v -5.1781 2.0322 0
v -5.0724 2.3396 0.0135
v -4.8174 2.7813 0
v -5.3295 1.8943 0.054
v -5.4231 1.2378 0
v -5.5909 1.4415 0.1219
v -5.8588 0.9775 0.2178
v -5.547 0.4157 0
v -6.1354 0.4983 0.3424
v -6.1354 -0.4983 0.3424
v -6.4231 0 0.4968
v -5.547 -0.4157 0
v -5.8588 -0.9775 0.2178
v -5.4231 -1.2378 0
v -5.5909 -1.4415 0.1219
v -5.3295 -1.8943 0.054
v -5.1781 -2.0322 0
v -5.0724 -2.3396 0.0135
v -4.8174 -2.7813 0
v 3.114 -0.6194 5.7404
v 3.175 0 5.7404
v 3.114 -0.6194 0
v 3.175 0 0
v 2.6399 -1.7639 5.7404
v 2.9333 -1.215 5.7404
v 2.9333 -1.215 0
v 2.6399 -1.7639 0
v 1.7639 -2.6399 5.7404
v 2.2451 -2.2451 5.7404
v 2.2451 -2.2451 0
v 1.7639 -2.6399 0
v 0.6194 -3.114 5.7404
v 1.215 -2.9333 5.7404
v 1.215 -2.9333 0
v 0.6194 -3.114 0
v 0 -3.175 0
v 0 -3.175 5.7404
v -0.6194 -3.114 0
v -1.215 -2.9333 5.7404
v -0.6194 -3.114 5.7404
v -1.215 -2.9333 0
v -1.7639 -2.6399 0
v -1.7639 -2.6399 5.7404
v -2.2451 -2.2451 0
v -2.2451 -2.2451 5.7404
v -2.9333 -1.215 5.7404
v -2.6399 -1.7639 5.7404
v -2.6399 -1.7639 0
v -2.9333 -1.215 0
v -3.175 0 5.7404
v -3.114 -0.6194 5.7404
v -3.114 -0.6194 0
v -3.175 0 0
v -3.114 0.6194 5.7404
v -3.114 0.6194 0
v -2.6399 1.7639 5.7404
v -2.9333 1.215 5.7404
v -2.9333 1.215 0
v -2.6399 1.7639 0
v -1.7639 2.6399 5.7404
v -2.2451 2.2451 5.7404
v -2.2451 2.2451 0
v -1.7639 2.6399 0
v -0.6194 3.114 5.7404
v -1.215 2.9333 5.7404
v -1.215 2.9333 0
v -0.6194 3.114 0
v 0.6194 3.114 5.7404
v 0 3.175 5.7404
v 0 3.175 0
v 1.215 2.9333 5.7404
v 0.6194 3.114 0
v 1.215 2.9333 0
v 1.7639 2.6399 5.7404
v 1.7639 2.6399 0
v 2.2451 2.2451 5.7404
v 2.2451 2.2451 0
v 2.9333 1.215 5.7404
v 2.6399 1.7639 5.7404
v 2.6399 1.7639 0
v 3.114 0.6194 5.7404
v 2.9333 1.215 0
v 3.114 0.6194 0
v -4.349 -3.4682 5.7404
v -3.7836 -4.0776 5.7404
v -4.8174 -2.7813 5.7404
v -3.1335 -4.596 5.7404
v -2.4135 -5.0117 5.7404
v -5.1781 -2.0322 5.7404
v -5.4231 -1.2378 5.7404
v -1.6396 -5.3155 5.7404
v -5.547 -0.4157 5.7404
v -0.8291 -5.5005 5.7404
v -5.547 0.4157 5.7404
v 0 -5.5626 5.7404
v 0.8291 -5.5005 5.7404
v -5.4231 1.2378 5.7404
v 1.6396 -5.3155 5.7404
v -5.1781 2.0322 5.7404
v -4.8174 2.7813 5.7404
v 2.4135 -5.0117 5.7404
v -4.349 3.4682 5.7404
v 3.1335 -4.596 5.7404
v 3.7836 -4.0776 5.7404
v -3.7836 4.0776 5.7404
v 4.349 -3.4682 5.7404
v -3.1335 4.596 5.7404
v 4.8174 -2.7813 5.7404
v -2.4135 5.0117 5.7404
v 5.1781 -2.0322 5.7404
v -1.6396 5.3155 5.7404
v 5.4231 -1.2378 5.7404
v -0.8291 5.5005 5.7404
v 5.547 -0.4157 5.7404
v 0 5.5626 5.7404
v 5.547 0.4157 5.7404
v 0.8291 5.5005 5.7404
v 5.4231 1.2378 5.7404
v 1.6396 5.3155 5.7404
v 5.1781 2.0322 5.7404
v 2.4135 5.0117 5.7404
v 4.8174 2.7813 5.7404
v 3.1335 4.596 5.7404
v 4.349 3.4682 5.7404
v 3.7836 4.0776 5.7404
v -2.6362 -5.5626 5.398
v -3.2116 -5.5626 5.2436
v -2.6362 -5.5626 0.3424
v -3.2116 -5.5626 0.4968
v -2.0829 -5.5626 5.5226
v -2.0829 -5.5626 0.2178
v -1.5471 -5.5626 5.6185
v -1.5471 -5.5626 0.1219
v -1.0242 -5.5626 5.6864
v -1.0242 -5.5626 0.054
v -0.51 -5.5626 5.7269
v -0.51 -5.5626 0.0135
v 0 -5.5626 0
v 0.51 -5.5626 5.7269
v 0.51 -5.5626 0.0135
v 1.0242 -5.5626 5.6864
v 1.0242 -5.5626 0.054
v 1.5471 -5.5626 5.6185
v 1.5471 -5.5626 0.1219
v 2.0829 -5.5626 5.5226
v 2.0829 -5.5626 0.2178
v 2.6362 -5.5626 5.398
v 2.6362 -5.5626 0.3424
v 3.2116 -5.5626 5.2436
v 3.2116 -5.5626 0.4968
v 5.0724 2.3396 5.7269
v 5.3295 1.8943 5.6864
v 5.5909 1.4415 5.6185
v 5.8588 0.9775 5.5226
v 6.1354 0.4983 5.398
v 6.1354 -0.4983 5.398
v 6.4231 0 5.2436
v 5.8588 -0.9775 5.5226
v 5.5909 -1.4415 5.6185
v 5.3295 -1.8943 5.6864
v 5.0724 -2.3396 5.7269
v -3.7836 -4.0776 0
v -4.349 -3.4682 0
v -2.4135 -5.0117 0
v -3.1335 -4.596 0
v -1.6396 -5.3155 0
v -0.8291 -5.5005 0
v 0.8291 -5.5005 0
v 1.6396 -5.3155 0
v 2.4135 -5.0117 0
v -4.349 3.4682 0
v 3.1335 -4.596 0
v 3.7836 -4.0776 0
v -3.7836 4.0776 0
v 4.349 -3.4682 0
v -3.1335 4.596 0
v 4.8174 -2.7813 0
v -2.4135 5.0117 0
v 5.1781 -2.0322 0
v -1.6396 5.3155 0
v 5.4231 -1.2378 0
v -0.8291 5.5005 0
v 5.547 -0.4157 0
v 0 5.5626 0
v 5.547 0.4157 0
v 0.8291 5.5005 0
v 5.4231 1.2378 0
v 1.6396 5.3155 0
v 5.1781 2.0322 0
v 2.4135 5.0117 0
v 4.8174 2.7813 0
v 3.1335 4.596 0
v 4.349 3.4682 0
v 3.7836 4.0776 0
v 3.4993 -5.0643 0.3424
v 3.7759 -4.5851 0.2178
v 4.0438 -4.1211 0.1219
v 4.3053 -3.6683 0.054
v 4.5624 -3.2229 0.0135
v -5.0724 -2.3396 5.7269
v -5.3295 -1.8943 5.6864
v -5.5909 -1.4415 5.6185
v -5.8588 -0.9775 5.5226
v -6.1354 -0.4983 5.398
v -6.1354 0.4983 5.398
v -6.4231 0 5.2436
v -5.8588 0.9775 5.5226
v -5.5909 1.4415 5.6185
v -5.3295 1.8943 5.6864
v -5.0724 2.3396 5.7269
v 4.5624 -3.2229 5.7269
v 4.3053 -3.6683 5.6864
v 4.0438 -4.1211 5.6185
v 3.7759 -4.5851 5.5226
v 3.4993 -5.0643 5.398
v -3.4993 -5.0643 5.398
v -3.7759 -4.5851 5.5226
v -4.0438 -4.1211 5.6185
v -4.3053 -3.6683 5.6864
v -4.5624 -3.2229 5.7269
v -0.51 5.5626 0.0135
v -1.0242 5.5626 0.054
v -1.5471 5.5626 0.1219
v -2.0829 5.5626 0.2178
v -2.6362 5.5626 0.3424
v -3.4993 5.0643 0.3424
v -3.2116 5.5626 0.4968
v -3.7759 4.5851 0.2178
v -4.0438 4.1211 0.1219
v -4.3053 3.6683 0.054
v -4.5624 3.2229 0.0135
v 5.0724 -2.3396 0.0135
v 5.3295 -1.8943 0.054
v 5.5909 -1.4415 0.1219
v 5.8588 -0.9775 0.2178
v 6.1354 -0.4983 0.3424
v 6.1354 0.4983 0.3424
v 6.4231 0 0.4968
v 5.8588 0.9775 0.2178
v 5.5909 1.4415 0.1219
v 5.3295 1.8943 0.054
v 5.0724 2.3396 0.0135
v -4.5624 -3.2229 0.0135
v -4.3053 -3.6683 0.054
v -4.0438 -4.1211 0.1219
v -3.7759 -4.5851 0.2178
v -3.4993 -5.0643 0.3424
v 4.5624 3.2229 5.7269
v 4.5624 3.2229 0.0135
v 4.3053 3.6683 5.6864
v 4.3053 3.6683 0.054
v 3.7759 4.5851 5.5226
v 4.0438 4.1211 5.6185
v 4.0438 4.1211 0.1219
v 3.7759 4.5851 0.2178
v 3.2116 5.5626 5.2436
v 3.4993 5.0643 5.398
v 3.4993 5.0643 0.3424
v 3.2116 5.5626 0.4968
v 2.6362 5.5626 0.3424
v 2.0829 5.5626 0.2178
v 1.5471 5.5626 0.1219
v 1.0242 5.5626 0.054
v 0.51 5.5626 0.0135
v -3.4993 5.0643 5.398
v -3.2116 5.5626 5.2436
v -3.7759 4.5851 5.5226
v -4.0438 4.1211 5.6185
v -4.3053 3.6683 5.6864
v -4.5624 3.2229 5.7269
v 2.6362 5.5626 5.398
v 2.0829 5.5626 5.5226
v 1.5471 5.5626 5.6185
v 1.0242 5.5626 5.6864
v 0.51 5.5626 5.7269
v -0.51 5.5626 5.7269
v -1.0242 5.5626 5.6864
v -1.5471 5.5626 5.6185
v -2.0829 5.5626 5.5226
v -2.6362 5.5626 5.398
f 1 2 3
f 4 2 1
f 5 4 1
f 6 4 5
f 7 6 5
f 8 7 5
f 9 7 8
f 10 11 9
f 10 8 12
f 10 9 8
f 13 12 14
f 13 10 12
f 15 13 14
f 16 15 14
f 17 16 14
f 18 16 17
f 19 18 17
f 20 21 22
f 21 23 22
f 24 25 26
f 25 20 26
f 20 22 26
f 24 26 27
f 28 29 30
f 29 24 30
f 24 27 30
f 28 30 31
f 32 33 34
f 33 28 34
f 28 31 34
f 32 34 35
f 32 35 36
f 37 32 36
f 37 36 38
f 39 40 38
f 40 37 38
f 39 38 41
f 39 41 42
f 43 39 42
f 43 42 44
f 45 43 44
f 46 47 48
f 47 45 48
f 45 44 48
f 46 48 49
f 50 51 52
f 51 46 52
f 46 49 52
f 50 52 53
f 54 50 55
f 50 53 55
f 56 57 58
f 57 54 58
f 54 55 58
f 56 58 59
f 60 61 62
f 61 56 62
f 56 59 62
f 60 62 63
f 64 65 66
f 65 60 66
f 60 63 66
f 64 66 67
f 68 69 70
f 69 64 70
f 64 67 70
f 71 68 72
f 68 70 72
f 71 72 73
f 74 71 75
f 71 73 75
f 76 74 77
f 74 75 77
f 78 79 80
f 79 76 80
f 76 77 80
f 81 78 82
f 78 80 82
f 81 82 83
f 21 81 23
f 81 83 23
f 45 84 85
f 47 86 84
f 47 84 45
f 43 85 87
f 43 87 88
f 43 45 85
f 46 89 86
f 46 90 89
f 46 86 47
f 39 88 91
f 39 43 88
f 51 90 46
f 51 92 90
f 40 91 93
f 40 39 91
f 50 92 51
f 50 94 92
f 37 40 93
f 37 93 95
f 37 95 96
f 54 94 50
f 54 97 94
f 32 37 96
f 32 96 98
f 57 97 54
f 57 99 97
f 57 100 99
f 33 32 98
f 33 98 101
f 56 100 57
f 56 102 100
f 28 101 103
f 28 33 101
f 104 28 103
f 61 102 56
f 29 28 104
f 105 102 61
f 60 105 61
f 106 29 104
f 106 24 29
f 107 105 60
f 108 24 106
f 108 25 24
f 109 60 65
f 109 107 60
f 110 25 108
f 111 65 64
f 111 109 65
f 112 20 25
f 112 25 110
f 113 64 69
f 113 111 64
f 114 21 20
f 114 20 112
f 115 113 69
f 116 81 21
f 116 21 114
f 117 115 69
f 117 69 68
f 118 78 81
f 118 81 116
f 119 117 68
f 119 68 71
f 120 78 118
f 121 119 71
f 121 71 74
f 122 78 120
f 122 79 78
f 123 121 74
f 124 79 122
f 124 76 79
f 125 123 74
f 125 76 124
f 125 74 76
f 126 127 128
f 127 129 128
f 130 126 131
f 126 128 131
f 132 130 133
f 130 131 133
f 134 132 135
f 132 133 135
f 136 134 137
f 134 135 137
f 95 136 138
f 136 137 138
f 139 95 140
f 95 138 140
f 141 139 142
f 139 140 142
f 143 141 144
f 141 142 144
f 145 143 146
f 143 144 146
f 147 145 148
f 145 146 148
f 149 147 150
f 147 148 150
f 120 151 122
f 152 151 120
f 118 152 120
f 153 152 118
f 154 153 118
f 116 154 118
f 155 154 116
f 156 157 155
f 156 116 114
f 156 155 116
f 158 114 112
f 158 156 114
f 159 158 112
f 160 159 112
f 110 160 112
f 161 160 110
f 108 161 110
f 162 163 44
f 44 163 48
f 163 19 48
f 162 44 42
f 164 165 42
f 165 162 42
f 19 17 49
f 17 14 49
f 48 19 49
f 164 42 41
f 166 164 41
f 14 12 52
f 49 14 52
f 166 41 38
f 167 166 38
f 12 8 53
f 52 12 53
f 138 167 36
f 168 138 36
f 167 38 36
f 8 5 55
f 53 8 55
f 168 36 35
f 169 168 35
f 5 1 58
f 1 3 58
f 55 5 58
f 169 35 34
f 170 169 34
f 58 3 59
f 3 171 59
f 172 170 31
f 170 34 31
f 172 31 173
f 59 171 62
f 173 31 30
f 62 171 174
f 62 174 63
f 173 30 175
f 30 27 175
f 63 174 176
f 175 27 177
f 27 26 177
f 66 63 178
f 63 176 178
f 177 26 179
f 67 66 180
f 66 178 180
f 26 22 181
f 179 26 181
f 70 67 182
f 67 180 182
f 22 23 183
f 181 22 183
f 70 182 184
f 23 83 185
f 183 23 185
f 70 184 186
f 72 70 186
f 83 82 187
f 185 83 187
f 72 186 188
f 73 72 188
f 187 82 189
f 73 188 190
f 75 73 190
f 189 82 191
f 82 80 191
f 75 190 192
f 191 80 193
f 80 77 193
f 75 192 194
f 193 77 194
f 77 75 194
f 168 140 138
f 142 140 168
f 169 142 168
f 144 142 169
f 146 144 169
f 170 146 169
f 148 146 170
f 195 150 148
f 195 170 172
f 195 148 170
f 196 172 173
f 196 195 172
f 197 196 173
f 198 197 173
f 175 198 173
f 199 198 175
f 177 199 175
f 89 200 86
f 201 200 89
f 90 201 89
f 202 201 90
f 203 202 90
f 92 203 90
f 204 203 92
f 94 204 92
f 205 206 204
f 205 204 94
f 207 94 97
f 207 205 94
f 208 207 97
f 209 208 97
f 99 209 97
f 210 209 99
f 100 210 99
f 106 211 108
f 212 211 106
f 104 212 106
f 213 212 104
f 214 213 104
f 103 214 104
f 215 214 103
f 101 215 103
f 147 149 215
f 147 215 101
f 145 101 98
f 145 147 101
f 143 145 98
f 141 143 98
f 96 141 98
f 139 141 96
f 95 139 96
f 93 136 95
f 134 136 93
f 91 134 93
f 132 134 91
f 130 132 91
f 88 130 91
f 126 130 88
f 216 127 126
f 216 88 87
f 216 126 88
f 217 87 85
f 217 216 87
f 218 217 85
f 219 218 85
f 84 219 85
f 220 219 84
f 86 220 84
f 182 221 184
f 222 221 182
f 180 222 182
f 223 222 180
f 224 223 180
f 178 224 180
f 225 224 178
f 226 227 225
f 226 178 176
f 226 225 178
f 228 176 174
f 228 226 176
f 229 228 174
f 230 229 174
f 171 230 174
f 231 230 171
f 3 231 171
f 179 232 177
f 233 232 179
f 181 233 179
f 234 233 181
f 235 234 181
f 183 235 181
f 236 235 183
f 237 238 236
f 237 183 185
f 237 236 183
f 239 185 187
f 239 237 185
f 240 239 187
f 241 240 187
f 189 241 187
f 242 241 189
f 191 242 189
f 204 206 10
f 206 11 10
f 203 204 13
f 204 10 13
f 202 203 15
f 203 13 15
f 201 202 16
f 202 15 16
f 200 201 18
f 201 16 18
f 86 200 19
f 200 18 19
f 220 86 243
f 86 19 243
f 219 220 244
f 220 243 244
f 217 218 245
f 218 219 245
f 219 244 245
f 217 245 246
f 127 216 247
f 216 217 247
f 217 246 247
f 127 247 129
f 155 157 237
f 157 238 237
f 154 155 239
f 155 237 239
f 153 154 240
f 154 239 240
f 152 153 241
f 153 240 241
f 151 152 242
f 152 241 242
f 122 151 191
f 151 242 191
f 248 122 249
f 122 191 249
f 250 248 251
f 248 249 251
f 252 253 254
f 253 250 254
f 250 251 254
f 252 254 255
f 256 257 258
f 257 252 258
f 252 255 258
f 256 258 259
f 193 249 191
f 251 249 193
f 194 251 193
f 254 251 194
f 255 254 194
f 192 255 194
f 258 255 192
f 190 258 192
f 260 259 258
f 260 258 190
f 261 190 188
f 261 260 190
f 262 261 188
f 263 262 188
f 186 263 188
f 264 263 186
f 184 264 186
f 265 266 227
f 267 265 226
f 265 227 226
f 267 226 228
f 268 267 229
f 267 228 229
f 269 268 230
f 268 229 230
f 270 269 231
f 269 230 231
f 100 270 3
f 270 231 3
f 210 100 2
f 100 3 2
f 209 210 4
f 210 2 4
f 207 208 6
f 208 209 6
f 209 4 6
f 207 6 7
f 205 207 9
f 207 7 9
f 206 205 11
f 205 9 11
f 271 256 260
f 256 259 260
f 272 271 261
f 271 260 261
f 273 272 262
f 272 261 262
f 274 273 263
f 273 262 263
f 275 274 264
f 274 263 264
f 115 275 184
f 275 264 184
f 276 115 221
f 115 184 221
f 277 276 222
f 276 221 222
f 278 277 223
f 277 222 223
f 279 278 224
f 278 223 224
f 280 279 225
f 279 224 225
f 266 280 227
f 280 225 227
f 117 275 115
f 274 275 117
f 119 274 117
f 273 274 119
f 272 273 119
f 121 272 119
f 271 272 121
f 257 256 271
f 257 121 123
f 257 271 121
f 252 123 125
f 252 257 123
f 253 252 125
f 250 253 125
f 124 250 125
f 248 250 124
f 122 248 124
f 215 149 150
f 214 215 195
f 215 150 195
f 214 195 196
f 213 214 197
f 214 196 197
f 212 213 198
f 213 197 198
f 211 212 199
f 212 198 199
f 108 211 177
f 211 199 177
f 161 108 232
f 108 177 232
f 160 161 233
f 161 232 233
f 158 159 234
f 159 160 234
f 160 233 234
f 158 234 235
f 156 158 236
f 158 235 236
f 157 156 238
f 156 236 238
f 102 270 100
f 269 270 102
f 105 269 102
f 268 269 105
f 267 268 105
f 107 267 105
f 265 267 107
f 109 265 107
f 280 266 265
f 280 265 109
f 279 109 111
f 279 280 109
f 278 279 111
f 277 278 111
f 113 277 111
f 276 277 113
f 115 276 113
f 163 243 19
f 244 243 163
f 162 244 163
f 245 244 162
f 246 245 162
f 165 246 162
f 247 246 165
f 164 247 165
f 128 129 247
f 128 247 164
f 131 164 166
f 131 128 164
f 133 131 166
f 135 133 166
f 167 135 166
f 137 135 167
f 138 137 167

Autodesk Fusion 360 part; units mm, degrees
sketch "Sketch1" plane through (0, 0, 0) normal (0, 0, 1) x (1, 0, 0)
  circle A0 centre (0, 0) radius 3.175
  line L0 (-6.4231, 0) -> (-3.2116, -5.5626)
  line L1 (-3.2116, -5.5626) -> (3.2116, -5.5626)
  line L2 (3.2116, -5.5626) -> (6.4231, 0)
  line L3 (6.4231, 0) -> (3.2116, 5.5626)
  line L4 (3.2116, 5.5626) -> (-3.2116, 5.5626)
  line L5 (-3.2116, 5.5626) -> (-6.4231, 0)
  dimension "diameter" = 6.35
  dimension "hexwidth" = 11.1252
extrude "Extrude1" add sketch "Sketch1" along normal blind 5.7404
sketch "Sketch2" plane through (0, 0, 5.7404) normal (0, 0, 1) x (-1, 0, 0)
  circle A0 centre (0, 0) radius 3.175 construction
  line L0 (3.2116, -5.5626) -> (6.4231, 0) construction
  line L1 (6.4231, 0) -> (3.2116, 5.5626) construction
  line L2 (3.2116, 5.5626) -> (-3.2116, 5.5626) construction
  line L3 (-3.2116, 5.5626) -> (-6.4231, 0) construction
  line L4 (-6.4231, 0) -> (-3.2116, -5.5626) construction
  line L5 (-3.2116, -5.5626) -> (3.2116, -5.5626) construction
  circle A1 centre (0, 0) radius 5.5626
  circle A2 centre (0, 0) radius 30.9626
  dimension "hexcutoffset2" = 25.4
extrude "Extrude2" cut sketch "Sketch2" against normal blind 0.7366 draft -60
sketch "Sketch3" plane through (0, 0, 0) normal (0, 0, -1) x (1, 0, 0)
  circle A0 centre (0, 0) radius 3.175 construction
  line L0 (-6.4231, 0) -> (-3.2116, -5.5626) construction
  line L1 (-3.2116, -5.5626) -> (3.2116, -5.5626) construction
  line L2 (3.2116, -5.5626) -> (6.4231, 0) construction
  line L3 (6.4231, 0) -> (3.2116, 5.5626) construction
  line L4 (3.2116, 5.5626) -> (-3.2116, 5.5626) construction
  line L5 (-3.2116, 5.5626) -> (-6.4231, 0) construction
  circle A1 centre (0, 0) radius 5.5626
  circle A2 centre (0, 0) radius 30.9626
  dimension "hexcutoffset1" = 25.4
extrude "Extrude3" cut sketch "Sketch3" against normal blind 1.0414 draft -60
equation "thickness = 0.226 in"
equation "hexcut1 = -0.029 in"
equation "hexcut2 = -0.041 in"
